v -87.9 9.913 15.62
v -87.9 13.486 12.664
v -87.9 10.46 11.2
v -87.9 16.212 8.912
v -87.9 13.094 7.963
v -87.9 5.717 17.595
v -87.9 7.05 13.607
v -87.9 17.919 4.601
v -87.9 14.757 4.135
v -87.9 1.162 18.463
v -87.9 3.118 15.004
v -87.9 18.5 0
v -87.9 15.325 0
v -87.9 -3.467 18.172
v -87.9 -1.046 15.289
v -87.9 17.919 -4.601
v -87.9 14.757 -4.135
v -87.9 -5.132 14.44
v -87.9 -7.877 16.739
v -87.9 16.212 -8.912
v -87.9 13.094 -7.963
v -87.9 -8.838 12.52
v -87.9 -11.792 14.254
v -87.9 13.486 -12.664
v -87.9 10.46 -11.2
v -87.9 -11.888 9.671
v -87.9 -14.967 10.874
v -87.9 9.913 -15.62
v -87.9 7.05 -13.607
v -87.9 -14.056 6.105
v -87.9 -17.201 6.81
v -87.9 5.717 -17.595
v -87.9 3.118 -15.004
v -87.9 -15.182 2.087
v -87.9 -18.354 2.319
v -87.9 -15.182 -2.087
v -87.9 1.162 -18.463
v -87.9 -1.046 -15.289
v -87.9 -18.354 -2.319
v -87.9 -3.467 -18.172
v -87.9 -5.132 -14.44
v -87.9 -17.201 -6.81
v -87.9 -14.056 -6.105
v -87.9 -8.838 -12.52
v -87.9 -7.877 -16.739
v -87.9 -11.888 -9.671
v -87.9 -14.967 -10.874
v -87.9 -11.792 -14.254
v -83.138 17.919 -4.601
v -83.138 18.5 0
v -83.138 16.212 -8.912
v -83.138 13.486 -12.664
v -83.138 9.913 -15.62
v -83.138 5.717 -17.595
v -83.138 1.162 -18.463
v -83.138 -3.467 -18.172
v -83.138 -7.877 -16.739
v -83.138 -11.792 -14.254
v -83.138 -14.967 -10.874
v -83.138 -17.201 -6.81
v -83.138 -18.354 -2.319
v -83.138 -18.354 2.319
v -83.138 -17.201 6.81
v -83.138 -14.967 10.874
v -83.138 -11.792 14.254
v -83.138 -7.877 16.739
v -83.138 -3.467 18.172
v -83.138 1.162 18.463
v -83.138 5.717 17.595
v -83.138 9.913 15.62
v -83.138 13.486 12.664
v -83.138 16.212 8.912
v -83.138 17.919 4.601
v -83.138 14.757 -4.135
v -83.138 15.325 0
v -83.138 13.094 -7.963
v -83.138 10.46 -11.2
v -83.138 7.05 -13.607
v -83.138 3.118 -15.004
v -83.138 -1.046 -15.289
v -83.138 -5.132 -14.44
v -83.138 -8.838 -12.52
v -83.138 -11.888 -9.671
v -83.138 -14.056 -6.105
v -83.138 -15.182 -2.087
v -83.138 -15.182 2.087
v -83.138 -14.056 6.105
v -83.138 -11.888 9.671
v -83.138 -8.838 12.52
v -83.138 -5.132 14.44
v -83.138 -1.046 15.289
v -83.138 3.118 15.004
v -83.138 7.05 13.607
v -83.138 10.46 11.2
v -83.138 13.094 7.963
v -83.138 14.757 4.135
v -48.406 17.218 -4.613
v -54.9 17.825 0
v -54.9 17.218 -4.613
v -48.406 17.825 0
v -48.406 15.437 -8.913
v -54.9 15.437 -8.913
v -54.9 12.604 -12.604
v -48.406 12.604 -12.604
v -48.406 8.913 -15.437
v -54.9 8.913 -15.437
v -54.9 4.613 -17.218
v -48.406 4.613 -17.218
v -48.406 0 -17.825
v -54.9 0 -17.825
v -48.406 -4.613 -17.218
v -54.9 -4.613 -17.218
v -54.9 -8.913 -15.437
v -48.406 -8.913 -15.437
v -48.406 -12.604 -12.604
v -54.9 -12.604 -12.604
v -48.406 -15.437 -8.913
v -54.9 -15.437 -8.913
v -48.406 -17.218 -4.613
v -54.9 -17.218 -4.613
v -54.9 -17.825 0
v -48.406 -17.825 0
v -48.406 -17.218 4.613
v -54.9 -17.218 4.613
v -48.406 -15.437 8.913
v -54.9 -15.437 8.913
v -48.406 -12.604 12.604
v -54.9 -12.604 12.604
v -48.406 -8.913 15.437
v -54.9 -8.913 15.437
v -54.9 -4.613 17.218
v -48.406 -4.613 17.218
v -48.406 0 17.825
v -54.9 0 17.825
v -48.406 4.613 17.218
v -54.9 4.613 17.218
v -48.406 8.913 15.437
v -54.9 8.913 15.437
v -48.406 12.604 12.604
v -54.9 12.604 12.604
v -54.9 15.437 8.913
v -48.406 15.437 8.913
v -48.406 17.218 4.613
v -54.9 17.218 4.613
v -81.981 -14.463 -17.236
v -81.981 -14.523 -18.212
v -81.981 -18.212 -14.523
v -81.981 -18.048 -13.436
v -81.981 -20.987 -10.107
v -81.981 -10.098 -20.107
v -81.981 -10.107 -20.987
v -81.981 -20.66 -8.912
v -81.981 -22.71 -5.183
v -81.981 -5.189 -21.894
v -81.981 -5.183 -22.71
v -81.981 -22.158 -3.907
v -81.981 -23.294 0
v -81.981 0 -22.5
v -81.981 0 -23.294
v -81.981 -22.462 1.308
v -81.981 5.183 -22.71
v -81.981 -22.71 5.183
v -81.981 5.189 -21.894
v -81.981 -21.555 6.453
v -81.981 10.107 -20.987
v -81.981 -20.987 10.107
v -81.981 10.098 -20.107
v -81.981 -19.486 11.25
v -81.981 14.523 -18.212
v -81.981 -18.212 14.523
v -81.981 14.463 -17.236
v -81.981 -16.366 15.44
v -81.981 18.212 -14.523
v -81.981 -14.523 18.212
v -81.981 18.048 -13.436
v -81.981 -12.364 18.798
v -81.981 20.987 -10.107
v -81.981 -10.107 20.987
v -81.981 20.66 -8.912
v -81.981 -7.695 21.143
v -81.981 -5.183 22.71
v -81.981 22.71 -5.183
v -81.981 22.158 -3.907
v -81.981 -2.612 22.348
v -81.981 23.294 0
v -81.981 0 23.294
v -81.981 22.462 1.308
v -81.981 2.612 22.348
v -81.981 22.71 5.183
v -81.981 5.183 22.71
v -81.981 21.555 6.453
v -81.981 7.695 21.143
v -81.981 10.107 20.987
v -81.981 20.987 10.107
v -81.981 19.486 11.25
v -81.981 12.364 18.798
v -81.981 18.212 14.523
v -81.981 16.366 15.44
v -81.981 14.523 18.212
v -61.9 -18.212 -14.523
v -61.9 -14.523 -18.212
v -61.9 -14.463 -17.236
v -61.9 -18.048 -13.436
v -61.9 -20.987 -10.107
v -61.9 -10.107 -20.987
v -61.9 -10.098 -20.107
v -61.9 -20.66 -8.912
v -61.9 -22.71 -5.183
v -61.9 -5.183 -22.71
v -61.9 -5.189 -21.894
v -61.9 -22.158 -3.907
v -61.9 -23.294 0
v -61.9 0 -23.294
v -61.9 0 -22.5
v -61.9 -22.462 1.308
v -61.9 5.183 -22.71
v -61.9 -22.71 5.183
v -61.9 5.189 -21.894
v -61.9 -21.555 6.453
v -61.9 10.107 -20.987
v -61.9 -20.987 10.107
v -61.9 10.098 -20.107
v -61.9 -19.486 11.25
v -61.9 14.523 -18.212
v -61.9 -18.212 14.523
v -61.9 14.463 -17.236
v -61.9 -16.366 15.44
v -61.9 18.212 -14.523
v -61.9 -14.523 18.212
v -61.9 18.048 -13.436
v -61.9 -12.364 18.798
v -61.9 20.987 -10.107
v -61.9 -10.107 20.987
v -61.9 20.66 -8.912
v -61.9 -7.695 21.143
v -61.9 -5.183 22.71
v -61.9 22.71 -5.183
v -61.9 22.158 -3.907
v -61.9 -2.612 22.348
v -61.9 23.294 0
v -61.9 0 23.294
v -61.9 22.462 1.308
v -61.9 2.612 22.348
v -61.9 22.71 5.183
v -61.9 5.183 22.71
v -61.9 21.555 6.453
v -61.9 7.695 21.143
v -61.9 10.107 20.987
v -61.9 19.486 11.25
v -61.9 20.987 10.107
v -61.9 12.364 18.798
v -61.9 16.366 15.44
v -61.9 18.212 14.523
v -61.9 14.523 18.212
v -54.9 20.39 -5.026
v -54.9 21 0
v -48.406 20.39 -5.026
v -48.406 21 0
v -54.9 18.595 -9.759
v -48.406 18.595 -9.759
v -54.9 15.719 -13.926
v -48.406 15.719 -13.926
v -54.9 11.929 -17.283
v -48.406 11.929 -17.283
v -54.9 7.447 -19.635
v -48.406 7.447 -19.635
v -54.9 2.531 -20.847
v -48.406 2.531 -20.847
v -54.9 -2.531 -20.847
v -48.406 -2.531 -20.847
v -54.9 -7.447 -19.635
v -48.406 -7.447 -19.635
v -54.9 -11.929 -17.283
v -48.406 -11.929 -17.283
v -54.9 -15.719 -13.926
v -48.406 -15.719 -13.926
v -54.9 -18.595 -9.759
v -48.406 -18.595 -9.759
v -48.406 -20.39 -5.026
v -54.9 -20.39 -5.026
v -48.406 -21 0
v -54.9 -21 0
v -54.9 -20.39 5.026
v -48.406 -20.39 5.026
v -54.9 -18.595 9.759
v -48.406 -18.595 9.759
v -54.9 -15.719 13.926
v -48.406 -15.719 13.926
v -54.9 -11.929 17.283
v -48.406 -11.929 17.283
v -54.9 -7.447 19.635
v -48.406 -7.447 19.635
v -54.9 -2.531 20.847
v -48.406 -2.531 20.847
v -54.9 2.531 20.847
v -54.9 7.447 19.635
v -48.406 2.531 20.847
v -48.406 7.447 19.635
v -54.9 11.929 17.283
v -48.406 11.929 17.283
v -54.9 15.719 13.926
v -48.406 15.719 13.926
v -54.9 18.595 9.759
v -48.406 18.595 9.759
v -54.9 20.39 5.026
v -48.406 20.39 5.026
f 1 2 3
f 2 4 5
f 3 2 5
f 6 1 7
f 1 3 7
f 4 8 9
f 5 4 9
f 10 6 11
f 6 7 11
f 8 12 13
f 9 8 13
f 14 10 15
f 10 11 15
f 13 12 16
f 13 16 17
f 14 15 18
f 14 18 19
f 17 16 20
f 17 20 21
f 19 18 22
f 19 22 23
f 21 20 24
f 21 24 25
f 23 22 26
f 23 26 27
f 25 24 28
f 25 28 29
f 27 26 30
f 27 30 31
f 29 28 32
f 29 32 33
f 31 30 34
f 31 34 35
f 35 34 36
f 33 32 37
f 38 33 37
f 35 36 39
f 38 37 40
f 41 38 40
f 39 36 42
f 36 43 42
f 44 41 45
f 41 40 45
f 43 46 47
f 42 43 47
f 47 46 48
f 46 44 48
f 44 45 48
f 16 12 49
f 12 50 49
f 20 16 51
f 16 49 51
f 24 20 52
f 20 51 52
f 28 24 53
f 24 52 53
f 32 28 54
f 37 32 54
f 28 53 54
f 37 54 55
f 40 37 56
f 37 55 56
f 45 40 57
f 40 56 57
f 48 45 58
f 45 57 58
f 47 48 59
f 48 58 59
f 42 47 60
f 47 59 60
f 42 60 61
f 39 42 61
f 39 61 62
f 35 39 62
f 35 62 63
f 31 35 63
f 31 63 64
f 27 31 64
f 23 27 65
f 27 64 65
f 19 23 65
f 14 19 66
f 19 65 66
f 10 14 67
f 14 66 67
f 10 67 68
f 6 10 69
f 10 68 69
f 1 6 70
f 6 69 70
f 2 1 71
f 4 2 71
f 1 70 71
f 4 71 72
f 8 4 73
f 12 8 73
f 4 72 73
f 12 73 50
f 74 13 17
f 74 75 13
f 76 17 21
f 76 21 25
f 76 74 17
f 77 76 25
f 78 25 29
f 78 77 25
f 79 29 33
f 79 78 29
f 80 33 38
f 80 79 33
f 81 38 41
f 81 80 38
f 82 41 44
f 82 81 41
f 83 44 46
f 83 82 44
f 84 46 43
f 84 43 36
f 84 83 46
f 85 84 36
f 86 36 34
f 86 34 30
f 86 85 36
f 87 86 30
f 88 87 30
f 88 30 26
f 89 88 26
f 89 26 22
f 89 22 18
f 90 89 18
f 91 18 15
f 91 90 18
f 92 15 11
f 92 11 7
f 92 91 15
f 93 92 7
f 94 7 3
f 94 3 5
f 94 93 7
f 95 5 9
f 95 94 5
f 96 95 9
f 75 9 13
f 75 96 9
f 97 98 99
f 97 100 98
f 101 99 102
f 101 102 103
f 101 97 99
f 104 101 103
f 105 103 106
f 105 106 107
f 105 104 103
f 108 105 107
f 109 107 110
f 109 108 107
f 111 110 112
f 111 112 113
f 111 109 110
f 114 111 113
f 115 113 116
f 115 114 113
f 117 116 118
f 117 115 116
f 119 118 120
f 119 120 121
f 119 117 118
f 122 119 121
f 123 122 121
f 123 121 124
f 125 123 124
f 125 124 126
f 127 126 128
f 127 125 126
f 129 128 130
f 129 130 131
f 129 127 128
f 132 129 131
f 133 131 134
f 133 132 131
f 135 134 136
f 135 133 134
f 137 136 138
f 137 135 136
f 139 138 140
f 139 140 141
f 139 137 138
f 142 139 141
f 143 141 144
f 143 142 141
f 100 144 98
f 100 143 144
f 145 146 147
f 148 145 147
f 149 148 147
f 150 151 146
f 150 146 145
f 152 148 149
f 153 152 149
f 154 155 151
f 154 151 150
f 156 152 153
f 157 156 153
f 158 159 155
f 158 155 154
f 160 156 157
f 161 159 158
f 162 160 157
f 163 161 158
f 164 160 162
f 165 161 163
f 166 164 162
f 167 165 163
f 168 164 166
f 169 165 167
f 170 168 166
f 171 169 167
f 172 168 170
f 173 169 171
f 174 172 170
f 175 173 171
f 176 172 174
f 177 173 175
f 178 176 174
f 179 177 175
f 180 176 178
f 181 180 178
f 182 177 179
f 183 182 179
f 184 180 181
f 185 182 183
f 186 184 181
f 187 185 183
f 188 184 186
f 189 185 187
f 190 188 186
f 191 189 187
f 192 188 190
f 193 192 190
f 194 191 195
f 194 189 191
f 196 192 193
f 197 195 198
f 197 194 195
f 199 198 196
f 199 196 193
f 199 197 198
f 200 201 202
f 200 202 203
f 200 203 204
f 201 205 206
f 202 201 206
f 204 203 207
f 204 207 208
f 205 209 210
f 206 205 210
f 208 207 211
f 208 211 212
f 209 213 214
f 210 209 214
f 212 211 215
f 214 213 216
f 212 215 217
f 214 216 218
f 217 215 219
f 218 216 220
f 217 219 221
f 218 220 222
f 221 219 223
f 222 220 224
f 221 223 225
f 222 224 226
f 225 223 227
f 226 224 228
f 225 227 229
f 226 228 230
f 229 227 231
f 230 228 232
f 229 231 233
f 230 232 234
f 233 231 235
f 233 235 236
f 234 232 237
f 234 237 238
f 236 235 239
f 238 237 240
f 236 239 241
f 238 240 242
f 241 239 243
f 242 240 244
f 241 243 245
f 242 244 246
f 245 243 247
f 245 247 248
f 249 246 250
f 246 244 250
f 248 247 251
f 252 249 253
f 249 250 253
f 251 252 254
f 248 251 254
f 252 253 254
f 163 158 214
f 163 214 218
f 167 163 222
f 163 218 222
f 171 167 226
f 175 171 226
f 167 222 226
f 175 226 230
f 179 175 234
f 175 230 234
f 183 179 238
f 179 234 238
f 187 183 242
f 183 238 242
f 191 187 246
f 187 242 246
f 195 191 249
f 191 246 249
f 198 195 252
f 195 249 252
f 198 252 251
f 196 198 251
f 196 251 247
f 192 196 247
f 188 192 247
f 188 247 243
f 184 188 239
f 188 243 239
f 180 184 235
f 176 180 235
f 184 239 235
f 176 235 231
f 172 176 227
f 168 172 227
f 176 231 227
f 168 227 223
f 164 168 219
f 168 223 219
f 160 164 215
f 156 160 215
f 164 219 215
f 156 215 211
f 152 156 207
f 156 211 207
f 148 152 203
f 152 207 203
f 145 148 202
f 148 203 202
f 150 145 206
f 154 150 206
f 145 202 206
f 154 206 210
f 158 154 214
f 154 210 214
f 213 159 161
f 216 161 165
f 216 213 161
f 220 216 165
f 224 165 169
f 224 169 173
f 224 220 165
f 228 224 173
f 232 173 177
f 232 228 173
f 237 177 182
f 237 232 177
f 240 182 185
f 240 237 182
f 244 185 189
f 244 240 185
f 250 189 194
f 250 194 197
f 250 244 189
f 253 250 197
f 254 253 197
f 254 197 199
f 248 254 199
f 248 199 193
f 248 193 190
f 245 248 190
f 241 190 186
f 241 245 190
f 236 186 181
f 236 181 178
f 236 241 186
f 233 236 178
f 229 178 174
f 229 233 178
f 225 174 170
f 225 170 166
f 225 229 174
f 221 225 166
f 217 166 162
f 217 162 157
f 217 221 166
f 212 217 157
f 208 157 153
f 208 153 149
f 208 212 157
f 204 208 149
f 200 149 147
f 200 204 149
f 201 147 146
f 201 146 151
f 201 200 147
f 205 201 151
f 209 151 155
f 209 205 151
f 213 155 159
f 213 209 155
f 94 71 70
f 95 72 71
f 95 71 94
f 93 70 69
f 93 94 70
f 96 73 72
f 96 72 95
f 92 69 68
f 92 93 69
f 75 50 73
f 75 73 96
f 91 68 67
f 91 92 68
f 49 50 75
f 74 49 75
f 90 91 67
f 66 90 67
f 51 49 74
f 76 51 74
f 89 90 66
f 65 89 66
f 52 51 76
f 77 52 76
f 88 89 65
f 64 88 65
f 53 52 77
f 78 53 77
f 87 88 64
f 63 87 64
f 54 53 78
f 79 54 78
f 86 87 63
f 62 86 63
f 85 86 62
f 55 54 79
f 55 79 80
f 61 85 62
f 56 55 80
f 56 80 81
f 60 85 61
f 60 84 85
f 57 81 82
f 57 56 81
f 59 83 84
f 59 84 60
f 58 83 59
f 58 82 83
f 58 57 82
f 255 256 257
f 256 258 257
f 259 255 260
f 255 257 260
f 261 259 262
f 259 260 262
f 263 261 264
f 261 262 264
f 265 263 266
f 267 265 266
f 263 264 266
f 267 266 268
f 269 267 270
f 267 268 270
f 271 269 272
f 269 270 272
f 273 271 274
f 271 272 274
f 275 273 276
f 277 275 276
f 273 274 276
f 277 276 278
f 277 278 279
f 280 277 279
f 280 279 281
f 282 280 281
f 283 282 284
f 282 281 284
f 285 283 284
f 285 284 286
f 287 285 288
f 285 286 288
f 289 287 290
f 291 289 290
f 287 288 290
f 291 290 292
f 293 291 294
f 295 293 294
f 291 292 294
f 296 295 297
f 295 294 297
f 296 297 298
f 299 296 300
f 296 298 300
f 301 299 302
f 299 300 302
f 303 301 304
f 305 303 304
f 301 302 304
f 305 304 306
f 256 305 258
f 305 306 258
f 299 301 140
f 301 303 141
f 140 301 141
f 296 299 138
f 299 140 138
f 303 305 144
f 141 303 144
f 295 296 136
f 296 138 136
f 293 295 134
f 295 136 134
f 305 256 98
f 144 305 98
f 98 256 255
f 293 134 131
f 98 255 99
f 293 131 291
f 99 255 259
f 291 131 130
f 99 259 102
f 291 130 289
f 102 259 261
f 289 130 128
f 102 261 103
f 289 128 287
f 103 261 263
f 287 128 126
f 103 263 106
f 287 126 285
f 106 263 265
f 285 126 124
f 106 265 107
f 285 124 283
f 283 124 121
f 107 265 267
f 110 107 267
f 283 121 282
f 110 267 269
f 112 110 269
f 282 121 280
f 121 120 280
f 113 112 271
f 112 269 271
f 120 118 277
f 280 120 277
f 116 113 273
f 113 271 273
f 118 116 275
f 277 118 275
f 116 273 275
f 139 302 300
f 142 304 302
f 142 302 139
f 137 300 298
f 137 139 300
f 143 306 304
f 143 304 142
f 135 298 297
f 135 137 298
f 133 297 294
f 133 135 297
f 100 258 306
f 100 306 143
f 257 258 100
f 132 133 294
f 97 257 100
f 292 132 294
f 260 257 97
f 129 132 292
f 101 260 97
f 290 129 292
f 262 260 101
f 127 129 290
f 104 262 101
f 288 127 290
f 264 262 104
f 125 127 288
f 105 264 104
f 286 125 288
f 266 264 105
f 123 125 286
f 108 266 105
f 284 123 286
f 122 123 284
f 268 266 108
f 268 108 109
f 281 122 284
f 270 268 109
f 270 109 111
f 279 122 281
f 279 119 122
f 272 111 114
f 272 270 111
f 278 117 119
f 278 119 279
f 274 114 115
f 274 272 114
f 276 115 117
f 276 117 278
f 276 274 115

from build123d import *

# Parameters (mm, degrees)
SKETCH1_W   = 6.49375
SKETCH1_H   = 3.175
SKETCH1_W_2 = 4.7625
SKETCH2_W   = 20.081249954
SKETCH2_H   = 0.79375


with BuildPart() as part:
    # Sketch1 → Revolve1 (revolve)
    with BuildSketch(Plane.XY):
        with Locations((-51.65312504, 19.412500037)):
            Rectangle(SKETCH1_W, SKETCH1_H)
        with Locations((-85.51875008, 16.912499957)):
            Rectangle(SKETCH1_W_2, SKETCH1_H)
    revolve(axis=Axis((25.71622857, 0, 0), (-1, 0, 0)))


with BuildPart() as body_2:
    # Sketch2 → Revolve2 (revolve)
    with BuildSketch(Plane(origin=(0, 0, 0), x_dir=(1, 0, 0), z_dir=(0, 1, 0))):
        with Locations((-71.940625017, 22.896875)):
            Rectangle(SKETCH2_W, SKETCH2_H)
    revolve(axis=Axis((-121.060937532, 0, 0), (1, 0, 0)))


solid = Compound([part.part, body_2.part])
